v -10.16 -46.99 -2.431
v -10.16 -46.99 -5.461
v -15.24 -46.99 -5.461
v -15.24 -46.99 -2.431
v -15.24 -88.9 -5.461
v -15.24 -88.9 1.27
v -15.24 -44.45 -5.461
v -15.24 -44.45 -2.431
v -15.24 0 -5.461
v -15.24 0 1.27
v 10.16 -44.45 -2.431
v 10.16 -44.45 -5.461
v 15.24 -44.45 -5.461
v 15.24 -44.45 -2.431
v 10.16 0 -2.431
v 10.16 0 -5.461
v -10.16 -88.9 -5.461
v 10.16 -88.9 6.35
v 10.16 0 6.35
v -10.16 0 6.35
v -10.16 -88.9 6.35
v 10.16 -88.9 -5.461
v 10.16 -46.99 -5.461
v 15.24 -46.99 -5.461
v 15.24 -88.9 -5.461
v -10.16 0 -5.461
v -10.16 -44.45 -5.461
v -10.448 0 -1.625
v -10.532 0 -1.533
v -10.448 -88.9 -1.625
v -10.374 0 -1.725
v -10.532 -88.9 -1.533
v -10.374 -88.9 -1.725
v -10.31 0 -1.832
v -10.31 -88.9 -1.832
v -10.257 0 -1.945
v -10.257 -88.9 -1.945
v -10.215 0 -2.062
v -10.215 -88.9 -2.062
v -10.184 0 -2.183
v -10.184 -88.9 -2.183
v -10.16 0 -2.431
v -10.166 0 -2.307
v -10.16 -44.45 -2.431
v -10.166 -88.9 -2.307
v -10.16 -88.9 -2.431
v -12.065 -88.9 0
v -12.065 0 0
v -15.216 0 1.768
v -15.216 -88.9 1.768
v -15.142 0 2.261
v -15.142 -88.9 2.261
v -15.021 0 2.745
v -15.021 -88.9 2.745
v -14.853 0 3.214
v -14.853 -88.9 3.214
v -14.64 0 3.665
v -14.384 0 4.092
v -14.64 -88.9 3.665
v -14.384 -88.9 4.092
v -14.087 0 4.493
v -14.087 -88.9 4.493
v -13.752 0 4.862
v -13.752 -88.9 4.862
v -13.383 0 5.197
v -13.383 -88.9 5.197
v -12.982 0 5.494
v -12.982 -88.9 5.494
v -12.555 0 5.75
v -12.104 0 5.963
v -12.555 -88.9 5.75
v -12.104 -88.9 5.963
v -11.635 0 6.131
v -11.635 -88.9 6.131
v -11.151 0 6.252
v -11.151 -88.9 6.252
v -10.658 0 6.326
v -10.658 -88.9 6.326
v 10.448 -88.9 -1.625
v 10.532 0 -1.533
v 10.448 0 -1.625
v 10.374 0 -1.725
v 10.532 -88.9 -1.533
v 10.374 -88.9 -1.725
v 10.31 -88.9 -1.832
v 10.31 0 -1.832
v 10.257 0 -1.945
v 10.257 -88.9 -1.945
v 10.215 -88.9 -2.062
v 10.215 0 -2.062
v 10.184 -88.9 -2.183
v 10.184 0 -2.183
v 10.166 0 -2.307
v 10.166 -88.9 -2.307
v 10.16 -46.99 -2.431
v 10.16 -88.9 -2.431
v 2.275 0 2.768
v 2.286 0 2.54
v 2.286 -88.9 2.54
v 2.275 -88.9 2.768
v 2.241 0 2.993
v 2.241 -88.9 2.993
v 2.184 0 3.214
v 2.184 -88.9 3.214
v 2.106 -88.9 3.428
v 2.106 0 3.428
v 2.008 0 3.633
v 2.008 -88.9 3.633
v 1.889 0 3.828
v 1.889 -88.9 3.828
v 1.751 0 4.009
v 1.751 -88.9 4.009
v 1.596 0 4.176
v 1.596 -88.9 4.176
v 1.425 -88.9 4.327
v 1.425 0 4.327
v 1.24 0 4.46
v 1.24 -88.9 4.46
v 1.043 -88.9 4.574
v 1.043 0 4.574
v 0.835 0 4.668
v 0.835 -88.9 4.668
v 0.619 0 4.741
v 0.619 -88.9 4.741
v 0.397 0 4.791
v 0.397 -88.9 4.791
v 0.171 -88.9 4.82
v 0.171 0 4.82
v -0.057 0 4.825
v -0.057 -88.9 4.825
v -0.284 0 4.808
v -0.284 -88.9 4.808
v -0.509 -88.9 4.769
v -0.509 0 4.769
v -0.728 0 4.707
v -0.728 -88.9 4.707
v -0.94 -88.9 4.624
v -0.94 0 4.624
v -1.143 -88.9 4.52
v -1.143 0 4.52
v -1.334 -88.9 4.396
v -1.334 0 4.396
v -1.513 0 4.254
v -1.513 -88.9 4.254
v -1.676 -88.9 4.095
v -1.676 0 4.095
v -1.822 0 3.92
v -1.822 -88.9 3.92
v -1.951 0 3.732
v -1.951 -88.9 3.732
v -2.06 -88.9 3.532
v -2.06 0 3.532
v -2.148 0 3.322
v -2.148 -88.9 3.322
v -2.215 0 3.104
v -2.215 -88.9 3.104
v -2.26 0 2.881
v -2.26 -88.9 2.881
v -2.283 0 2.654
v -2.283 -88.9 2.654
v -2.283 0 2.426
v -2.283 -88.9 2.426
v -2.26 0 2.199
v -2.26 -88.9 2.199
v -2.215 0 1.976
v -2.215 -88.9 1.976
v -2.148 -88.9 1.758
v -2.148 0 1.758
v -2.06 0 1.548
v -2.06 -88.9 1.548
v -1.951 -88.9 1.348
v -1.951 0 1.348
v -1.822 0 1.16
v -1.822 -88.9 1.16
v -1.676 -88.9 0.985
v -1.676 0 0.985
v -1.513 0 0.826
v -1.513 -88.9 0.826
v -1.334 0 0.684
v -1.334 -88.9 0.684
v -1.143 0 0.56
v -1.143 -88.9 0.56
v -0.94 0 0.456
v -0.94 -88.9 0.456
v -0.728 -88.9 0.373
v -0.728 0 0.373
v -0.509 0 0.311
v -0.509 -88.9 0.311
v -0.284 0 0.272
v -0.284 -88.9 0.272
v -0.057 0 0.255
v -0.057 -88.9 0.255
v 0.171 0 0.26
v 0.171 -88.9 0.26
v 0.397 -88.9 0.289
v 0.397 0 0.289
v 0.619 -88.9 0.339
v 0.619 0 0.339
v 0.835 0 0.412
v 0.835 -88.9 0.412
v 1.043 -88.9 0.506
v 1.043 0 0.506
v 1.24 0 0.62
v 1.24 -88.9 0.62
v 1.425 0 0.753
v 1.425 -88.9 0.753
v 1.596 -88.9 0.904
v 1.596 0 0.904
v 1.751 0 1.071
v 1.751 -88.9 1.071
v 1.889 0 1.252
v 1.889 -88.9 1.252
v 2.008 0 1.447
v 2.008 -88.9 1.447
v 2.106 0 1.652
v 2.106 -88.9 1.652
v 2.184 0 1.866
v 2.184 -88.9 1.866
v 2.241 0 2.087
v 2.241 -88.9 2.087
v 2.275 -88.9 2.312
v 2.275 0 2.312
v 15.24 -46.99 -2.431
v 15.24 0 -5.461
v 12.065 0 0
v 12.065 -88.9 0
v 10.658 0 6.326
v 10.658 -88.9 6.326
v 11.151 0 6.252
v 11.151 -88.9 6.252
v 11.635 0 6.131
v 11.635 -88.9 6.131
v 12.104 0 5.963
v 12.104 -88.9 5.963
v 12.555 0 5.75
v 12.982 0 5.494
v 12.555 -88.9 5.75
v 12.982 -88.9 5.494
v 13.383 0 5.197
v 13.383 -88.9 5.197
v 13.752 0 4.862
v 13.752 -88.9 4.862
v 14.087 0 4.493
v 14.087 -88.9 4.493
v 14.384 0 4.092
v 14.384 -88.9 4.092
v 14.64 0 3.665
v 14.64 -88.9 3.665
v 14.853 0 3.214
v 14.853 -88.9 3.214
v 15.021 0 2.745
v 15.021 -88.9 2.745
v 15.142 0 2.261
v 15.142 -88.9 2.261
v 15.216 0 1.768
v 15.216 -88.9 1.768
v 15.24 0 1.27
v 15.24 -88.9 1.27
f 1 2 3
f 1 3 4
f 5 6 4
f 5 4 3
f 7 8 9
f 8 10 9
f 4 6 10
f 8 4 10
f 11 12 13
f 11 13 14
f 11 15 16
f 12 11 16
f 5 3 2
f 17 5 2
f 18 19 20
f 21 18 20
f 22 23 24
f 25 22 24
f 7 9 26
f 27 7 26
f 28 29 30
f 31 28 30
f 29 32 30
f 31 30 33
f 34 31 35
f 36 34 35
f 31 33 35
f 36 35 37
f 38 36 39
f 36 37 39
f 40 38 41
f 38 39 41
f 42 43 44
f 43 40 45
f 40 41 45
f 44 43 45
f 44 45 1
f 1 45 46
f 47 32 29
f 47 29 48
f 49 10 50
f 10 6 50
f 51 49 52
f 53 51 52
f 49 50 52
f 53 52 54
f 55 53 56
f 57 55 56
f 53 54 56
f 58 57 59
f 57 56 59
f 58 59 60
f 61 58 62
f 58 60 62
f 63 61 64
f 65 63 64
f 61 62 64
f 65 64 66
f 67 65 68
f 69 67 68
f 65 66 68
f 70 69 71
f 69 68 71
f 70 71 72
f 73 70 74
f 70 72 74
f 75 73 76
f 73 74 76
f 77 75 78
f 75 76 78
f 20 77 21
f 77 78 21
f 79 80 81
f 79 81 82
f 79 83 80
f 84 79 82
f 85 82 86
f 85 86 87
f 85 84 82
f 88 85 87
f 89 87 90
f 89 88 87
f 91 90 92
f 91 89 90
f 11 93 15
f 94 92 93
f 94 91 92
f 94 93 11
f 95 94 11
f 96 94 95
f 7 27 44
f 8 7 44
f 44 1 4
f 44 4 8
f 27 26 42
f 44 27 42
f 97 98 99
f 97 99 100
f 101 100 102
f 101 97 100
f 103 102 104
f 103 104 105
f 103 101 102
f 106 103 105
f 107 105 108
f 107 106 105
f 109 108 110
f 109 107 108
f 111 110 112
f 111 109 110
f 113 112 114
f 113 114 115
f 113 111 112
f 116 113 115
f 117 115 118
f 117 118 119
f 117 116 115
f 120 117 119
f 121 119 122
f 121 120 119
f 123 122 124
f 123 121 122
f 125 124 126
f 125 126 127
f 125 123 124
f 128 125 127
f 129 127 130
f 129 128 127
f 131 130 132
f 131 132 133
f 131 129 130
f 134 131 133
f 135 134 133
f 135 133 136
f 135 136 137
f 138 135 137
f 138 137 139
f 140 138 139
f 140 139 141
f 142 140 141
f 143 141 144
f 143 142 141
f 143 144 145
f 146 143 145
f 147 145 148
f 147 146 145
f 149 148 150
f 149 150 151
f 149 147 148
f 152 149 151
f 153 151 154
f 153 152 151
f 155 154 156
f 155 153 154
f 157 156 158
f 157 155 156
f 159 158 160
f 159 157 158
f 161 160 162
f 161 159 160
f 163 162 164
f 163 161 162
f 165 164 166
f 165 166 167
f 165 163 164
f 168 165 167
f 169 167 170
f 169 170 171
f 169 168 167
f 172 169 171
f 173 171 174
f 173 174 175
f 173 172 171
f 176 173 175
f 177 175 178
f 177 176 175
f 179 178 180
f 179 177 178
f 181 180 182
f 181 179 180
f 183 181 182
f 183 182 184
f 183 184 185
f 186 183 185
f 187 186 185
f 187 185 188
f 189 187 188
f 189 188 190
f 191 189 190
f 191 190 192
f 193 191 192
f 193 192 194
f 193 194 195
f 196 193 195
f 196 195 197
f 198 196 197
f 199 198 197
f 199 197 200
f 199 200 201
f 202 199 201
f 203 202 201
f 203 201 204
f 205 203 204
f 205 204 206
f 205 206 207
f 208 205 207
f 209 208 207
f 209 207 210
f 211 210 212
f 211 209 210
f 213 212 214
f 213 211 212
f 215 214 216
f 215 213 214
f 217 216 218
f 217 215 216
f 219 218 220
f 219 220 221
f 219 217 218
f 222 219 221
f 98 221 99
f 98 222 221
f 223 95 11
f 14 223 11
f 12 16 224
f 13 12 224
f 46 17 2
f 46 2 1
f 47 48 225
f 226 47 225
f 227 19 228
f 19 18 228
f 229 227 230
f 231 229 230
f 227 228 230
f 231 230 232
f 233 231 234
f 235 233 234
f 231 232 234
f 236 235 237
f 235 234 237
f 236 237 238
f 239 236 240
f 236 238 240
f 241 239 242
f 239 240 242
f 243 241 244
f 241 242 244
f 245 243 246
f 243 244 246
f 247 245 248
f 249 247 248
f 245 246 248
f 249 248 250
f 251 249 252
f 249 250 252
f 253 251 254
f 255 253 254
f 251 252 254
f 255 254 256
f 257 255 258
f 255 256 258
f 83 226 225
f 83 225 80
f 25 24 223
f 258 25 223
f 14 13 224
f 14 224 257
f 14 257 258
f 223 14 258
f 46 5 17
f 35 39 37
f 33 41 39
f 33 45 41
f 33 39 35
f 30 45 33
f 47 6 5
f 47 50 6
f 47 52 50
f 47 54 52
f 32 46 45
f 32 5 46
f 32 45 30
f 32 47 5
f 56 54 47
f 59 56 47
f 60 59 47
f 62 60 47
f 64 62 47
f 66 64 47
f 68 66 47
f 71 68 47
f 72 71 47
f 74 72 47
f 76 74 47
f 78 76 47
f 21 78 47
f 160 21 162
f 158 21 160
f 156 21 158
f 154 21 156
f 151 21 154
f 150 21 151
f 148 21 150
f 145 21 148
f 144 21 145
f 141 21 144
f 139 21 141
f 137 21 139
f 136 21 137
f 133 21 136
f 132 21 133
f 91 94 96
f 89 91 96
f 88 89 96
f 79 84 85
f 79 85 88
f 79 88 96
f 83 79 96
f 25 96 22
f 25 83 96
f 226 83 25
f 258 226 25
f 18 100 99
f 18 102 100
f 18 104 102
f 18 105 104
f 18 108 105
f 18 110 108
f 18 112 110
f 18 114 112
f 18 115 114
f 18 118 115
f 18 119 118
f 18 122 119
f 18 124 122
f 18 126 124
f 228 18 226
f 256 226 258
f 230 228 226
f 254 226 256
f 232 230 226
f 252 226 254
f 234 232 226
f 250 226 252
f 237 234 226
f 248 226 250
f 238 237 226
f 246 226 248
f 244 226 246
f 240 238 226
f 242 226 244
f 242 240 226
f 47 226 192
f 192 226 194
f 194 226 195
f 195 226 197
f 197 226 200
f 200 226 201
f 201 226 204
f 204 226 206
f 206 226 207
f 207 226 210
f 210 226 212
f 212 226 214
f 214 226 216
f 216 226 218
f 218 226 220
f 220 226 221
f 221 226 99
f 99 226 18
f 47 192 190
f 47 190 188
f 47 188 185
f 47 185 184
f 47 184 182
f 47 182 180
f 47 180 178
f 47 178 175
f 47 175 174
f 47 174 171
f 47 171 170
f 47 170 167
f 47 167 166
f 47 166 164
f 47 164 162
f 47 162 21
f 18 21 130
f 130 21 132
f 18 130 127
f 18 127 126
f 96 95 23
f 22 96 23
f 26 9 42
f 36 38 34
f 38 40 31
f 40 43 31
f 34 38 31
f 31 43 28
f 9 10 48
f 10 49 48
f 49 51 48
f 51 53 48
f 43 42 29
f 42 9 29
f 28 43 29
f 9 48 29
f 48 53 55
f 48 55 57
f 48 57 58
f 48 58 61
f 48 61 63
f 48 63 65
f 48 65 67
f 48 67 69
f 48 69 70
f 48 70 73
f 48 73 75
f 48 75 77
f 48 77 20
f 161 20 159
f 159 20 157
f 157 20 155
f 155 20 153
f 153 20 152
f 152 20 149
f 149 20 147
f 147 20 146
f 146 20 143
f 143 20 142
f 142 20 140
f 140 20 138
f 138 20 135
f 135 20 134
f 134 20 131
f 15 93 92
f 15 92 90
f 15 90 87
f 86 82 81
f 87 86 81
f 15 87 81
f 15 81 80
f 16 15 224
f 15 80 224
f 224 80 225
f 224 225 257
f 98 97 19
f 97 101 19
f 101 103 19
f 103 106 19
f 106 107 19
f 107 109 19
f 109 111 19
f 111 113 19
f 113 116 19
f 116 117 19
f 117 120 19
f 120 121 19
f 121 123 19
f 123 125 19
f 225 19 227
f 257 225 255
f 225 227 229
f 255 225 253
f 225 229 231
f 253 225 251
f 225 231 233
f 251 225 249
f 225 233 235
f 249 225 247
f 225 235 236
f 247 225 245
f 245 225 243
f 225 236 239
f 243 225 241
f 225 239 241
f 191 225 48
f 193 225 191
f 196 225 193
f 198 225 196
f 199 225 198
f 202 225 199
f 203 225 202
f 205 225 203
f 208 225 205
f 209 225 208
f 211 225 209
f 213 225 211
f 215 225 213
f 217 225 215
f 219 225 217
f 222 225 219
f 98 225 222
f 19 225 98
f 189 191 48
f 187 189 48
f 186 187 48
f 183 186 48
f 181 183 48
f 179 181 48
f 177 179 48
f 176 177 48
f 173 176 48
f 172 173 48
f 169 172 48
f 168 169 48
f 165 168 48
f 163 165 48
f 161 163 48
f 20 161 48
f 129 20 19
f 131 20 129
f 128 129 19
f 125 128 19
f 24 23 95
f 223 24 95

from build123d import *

# Parameters (mm, degrees)
F0_R          = 2.286
F1_DEPTH      = 88.9
F2_R          = 1.27
F3_R          = 5.08
F4_W          = 2.54
F4_H          = 3.0299487758
F5_DEPTH      = 5.081
F5_DEPTH_BACK = 25.401


with BuildPart() as f1:
    # F0 (on Front) → F1 (new body)
    with BuildSketch(Plane.XZ):
        Polygon((-12.065, 0), (0, 0), (12.065, 0), (10.16, -1.905), (10.16, -5.461), (15.24, -5.461), (15.24, 6.35), (0, 6.35), (-15.24, 6.35), (-15.24, -5.461), (-10.16, -5.461), (-10.16, -1.905), align=None)
        with Locations((0, 2.54)):
            Circle(F0_R, mode=Mode.SUBTRACT)
    extrude(amount=F1_DEPTH)

    # F2
    f2_edges = [f1.edges().sort_by_distance(p)[0] for p in [
        (-10.16, -44.45, -1.905),
        (10.16, -44.45, -1.905),
    ]]
    fillet(f2_edges, radius=F2_R)

    # F3
    f3_edges = [f1.edges().sort_by_distance(p)[0] for p in [
        (-15.24, -44.45, 6.35),
        (15.24, -44.45, 6.35),
    ]]
    fillet(f3_edges, radius=F3_R)

    # F4 (on face) → F5 (cut, two sides)
    with BuildSketch(Plane.YZ.offset(-10.16)) as f5_sk:
        with Locations((-45.72, -3.9460256121)):
            Rectangle(F4_W, F4_H)
    extrude(amount=-F5_DEPTH, mode=Mode.SUBTRACT)
    extrude(f5_sk.sketch, amount=F5_DEPTH_BACK, mode=Mode.SUBTRACT)


solid = f1.part
